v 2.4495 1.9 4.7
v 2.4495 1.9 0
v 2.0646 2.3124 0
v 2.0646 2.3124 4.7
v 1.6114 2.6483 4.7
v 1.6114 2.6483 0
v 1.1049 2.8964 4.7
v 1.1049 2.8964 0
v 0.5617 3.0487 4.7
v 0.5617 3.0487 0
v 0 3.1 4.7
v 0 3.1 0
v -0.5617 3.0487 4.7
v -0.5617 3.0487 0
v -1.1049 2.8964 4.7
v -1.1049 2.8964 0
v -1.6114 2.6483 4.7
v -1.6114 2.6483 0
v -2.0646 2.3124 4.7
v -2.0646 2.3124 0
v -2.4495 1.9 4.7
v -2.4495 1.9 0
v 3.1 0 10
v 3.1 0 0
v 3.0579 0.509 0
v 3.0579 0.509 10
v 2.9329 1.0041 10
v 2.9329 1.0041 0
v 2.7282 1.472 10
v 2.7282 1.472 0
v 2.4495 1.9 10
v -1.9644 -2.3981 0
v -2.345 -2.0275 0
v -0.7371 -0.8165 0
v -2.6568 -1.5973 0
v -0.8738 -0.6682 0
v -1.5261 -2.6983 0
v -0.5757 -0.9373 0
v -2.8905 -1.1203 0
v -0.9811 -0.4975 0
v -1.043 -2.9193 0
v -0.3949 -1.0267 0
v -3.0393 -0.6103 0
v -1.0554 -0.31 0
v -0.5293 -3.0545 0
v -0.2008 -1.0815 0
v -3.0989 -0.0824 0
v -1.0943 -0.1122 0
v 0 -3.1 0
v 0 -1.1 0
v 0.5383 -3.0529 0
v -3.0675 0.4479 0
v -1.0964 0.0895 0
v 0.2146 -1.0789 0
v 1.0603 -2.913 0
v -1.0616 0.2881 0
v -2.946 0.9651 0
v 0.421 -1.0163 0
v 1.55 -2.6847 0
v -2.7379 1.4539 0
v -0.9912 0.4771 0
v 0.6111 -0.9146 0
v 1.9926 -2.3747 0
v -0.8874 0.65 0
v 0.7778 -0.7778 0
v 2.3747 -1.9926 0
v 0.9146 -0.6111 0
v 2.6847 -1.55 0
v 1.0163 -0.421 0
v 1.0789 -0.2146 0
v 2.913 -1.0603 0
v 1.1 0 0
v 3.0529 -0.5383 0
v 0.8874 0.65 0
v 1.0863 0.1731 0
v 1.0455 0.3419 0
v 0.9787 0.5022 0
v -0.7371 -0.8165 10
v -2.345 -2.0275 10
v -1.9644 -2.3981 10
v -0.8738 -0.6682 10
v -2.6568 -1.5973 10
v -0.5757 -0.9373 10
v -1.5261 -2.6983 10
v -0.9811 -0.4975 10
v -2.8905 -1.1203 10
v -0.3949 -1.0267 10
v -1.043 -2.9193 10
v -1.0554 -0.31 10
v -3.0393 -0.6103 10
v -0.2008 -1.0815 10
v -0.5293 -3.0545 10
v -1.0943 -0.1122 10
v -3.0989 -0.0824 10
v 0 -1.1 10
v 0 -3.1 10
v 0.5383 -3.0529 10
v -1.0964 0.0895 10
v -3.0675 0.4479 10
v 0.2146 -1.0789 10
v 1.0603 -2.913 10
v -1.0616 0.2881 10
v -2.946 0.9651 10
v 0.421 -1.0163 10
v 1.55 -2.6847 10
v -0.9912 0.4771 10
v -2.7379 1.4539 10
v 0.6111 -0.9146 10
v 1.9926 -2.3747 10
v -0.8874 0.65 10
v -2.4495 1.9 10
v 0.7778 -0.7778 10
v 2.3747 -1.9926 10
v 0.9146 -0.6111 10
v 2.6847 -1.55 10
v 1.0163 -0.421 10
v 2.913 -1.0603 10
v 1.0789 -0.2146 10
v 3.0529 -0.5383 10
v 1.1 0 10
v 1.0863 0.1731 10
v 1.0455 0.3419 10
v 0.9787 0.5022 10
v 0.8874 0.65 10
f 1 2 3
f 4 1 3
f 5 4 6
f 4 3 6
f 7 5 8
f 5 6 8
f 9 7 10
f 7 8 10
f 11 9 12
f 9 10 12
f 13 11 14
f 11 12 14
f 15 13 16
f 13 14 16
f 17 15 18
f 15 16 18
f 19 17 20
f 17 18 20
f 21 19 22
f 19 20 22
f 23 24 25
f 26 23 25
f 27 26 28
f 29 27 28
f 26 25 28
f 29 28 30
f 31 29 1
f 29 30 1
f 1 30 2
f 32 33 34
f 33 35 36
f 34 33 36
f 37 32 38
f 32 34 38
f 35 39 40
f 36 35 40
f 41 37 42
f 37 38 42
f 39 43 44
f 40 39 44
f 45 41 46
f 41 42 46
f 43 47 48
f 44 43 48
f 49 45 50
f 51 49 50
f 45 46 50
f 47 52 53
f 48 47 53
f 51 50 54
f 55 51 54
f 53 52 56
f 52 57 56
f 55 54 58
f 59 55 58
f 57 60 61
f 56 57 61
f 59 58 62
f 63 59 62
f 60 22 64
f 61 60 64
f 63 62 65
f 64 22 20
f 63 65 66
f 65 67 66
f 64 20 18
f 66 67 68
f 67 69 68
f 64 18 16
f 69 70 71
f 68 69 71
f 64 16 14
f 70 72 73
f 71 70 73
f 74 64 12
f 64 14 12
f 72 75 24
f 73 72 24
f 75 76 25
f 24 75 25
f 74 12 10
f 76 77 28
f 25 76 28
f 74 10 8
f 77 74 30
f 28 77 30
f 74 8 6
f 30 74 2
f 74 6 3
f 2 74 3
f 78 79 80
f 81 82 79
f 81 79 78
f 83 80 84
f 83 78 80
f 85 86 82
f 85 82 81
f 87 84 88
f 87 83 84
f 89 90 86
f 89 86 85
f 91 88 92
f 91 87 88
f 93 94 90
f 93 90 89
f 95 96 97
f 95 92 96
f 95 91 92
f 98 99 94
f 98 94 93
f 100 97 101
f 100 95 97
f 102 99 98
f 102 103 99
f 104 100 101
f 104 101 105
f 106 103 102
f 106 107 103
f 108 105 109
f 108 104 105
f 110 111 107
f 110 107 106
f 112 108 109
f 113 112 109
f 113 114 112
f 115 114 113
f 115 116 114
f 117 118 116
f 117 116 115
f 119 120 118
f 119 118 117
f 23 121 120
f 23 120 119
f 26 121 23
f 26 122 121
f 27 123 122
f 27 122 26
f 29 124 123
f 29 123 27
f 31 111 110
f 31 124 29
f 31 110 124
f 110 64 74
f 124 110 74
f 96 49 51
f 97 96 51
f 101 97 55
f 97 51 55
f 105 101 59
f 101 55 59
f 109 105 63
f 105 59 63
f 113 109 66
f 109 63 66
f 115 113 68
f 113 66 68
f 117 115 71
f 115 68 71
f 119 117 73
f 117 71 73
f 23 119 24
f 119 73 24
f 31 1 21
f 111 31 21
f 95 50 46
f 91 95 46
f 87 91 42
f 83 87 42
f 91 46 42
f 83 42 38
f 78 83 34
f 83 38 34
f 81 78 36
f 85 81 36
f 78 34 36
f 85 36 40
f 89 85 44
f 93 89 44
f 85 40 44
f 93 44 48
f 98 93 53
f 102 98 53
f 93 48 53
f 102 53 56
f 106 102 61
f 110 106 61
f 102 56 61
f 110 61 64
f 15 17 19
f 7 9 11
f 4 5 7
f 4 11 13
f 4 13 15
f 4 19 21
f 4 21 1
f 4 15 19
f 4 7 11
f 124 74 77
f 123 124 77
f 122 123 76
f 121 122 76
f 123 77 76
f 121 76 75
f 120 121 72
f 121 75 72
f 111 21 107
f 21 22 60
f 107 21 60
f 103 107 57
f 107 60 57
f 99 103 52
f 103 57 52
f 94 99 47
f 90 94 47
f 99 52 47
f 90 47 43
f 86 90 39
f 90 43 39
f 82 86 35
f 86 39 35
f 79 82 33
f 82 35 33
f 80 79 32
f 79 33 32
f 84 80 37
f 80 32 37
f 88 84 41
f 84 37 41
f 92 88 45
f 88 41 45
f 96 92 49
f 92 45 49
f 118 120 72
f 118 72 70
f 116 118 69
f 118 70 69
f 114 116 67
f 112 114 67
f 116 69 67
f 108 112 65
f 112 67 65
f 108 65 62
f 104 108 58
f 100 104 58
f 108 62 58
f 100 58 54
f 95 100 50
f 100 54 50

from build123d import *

# Parameters (mm, degrees)
F1_DEPTH = 10
F2_DEPTH = 4.7


with BuildPart() as f1:
    # F0 (on Top) → F1 (new body)
    with BuildSketch(Plane.XY):
        with BuildLine():
            ThreePointArc((0, -3.1), (2.1920310217, -2.1920310217), (3.1, 0))
            ThreePointArc((3.1, 0), (2.9328670446, 1.0041368924), (2.4494897428, 1.9))
            Line((2.4494897428, 1.9), (0, 1.9))
            Line((0, 1.9), (0, 1.1))
            ThreePointArc((0, 1.1), (0.4974937186, 0.9810708435), (0.8874119675, 0.65))
            ThreePointArc((0.8874119675, 0.65), (1.0455030283, 0.3419406643), (1.1, 0))
            ThreePointArc((1.1, 0), (0.7778174593, -0.7778174593), (0, -1.1))
            Line((0, -1.1), (0, -3.1))
        make_face()
        with BuildLine():
            ThreePointArc((-2.4494897428, 1.9), (-2.7838821814, -1.3638181697), (0, -3.1))
            Line((0, -3.1), (0, -1.1))
            ThreePointArc((0, -1.1), (-0.9810708435, -0.4974937186), (-0.8874119675, 0.65))
            ThreePointArc((-0.8874119675, 0.65), (-0.4974937186, 0.9810708435), (0, 1.1))
            Line((0, 1.1), (0, 1.9))
            Line((0, 1.9), (-2.4494897428, 1.9))
        make_face()
        with BuildLine():
            ThreePointArc((0.8874119675, 0.65), (0.4974937186, 0.9810708435), (0, 1.1))
            Line((0, 1.1), (0, 0.65))
            Line((0, 0.65), (0.8874119675, 0.65))
        make_face()
        with BuildLine():
            Line((0, 0.65), (0, 1.1))
            ThreePointArc((0, 1.1), (-0.4974937186, 0.9810708435), (-0.8874119675, 0.65))
            Line((-0.8874119675, 0.65), (0, 0.65))
        make_face()
    extrude(amount=F1_DEPTH)

    # F0 (on Top) → F2 (join)
    with BuildSketch(Plane.XY):
        with BuildLine():
            Line((0, 1.9), (2.4494897428, 1.9))
            ThreePointArc((2.4494897428, 1.9), (0, 3.1), (-2.4494897428, 1.9))
            Line((-2.4494897428, 1.9), (0, 1.9))
        make_face()
    extrude(amount=F2_DEPTH)


solid = f1.part
